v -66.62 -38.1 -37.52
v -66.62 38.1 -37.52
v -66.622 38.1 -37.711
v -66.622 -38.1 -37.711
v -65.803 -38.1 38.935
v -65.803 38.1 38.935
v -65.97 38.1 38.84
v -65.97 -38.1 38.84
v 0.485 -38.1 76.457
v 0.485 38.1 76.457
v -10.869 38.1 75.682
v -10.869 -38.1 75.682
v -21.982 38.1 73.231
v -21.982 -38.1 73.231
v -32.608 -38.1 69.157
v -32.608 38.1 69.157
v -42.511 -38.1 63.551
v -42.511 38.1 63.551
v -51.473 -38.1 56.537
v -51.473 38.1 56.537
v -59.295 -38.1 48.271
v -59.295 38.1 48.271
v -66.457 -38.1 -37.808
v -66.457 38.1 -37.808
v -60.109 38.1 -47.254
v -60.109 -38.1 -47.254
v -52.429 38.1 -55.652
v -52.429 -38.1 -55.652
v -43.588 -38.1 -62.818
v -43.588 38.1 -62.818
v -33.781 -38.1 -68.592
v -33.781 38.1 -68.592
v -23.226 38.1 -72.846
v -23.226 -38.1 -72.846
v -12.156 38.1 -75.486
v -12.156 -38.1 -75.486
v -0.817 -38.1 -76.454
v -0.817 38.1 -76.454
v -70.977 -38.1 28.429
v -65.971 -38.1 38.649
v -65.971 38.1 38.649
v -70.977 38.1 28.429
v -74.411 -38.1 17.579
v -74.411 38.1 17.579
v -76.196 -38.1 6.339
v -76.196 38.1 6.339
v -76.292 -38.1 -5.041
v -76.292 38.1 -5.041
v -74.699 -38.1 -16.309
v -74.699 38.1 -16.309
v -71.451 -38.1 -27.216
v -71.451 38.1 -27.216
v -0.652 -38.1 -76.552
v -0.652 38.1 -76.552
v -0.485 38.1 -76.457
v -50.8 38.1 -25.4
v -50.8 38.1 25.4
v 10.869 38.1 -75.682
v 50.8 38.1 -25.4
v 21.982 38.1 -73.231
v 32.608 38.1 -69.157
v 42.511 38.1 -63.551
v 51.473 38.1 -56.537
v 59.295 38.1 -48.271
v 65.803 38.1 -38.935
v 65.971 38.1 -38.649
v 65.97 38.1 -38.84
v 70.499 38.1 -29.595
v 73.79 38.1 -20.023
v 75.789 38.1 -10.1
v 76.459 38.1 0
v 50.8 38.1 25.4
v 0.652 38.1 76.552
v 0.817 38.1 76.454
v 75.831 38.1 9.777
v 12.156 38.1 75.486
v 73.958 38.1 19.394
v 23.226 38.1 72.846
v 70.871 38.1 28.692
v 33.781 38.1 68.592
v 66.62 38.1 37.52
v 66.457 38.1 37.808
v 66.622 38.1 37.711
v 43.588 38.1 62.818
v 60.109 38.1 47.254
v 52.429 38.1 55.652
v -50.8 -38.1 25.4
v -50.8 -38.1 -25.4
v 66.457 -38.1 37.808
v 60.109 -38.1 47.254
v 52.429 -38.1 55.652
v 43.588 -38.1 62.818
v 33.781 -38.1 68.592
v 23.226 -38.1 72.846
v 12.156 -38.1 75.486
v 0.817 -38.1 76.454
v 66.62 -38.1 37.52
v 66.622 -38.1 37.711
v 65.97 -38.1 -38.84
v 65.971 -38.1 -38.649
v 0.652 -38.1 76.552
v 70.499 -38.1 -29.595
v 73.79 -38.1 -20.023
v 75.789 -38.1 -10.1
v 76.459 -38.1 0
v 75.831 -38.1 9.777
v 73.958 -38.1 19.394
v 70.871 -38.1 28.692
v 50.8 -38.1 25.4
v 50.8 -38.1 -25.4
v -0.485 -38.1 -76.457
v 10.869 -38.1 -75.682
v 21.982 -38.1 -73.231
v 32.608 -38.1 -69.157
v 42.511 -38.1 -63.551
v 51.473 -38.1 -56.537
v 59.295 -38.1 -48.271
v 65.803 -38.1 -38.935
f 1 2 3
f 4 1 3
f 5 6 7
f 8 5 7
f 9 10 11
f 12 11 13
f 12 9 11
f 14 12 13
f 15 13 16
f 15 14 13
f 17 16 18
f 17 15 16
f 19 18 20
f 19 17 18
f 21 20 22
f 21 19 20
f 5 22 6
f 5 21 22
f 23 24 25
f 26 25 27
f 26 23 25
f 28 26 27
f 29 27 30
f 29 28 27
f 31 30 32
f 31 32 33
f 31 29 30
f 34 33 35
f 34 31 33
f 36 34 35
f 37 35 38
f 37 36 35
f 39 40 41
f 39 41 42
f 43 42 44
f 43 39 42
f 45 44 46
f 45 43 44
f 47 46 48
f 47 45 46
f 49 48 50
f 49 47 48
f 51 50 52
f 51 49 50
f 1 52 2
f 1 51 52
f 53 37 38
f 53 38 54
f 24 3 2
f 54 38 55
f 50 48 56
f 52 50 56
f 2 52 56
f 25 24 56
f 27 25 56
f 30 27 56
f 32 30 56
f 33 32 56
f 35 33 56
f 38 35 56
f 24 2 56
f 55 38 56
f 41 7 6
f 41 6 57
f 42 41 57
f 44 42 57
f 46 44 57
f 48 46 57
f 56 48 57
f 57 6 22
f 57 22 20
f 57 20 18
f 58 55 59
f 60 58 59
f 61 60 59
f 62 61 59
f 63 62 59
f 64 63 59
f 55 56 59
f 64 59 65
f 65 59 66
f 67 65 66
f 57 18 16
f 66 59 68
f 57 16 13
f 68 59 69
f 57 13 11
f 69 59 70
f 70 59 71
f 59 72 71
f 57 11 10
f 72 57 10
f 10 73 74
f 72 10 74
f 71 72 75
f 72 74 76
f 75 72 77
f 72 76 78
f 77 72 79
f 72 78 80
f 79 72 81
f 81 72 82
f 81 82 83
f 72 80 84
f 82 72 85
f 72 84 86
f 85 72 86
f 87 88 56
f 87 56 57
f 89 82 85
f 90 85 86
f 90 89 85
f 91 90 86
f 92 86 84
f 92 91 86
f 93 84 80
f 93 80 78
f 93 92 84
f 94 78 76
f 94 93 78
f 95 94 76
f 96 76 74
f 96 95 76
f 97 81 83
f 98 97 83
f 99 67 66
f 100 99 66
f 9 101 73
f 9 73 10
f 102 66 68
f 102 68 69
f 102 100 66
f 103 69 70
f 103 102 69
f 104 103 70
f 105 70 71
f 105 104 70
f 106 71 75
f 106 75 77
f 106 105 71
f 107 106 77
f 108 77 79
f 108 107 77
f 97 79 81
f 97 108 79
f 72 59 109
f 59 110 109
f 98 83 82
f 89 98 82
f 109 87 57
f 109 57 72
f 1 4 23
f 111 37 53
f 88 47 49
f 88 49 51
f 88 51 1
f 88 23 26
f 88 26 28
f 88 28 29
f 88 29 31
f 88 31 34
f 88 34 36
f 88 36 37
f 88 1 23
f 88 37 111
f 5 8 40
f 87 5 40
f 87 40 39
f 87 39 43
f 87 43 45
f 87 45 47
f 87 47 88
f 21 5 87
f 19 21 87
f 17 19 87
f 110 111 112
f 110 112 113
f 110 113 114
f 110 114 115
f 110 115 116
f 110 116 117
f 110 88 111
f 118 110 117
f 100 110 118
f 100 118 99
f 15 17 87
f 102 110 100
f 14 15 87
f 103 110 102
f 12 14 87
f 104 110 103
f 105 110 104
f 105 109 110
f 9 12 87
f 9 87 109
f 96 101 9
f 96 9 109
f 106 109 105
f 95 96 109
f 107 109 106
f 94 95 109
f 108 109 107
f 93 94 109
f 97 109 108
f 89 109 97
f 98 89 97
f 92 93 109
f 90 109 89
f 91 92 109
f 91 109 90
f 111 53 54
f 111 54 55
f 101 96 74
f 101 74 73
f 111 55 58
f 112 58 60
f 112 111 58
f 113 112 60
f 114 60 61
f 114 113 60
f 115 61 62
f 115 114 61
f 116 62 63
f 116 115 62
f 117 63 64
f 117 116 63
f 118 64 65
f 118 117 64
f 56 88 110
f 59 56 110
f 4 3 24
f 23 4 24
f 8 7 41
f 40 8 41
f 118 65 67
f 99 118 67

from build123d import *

# Parameters (mm, degrees)
F0_W     = 101.6
F0_H     = 50.8
F1_DEPTH = 38.1


with BuildPart() as f1:
    # F0 (on Front) → F1 (new body, symmetric)
    with BuildSketch(Plane.XZ):
        with BuildLine():
            ThreePointArc((65.9712880145, -38.6489294899), (73.7903692418, -20.0232864477), (76.4588163197, 0))
            ThreePointArc((76.4588163197, 0), (73.9582301549, 19.3940915064), (66.6200350394, 37.5196151947))
            Line((66.6200350394, 37.5196151947), (65.9712880145, -38.6489294899))
        make_face()
        with BuildLine():
            Line((65.9712880145, -38.6489294899), (66.6200350394, 37.5196151947))
            ThreePointArc((66.6200350394, 37.5196151947), (66.5384735192, 37.6640695456), (66.4565987746, 37.808346596))
            Line((66.4565987746, 37.808346596), (0.8170776208, 76.4544503425))
            ThreePointArc((0.8170776208, 76.4544503425), (0.6511957232, 76.4560431695), (0.4853107601, 76.4572760859))
            Line((0.4853107601, 76.4572760859), (-65.8029574185, 38.9348351477))
            ThreePointArc((-65.8029574185, 38.9348351477), (-65.887277796, 38.7919736239), (-65.9712880145, 38.6489294899))
            Line((-65.9712880145, 38.6489294899), (-66.6200350394, -37.5196151947))
            ThreePointArc((-66.6200350394, -37.5196151947), (-66.5384735192, -37.6640695456), (-66.4565987746, -37.808346596))
            Line((-66.4565987746, -37.808346596), (-0.8170776208, -76.4544503425))
            ThreePointArc((-0.8170776208, -76.4544503425), (-0.6511957232, -76.4560431695), (-0.4853107601, -76.4572760859))
            Line((-0.4853107601, -76.4572760859), (65.8029574185, -38.9348351477))
            ThreePointArc((65.8029574185, -38.9348351477), (65.887277796, -38.7919736239), (65.9712880145, -38.6489294899))
        make_face()
        Rectangle(F0_W, F0_H, mode=Mode.SUBTRACT)
        with BuildLine():
            ThreePointArc((66.4565987746, 37.808346596), (66.5384735192, 37.6640695456), (66.6200350394, 37.5196151947))
            Line((66.6200350394, 37.5196151947), (66.6216664831, 37.7111608811))
            Line((66.6216664831, 37.7111608811), (66.4565987746, 37.808346596))
        make_face()
        with BuildLine():
            Line((65.9696565708, -38.8404751763), (65.9712880145, -38.6489294899))
            ThreePointArc((65.9712880145, -38.6489294899), (65.887277796, -38.7919736239), (65.8029574185, -38.9348351477))
            Line((65.8029574185, -38.9348351477), (65.9696565708, -38.8404751763))
        make_face()
        with BuildLine():
            Line((0.8170776208, 76.4544503425), (66.4565987746, 37.808346596))
            ThreePointArc((66.4565987746, 37.808346596), (38.7919736239, 65.887277796), (0.8170776208, 76.4544503425))
        make_face()
        with BuildLine():
            ThreePointArc((-0.4853107601, -76.4572760859), (37.6640695456, -66.5384735192), (65.8029574185, -38.9348351477))
            Line((65.8029574185, -38.9348351477), (-0.4853107601, -76.4572760859))
        make_face()
        with BuildLine():
            ThreePointArc((0.4853107601, 76.4572760859), (0.6511957232, 76.4560431695), (0.8170776208, 76.4544503425))
            Line((0.8170776208, 76.4544503425), (0.6520099123, 76.5516360573))
            Line((0.6520099123, 76.5516360573), (0.4853107601, 76.4572760859))
        make_face()
        with BuildLine():
            Line((-0.6520099123, -76.5516360573), (-0.4853107601, -76.4572760859))
            ThreePointArc((-0.4853107601, -76.4572760859), (-0.6511957232, -76.4560431695), (-0.8170776208, -76.4544503425))
            Line((-0.8170776208, -76.4544503425), (-0.6520099123, -76.5516360573))
        make_face()
        with BuildLine():
            Line((-65.8029574185, 38.9348351477), (0.4853107601, 76.4572760859))
            ThreePointArc((0.4853107601, 76.4572760859), (-37.6640695456, 66.5384735192), (-65.8029574185, 38.9348351477))
        make_face()
        with BuildLine():
            ThreePointArc((-66.4565987746, -37.808346596), (-38.7919736239, -65.887277796), (-0.8170776208, -76.4544503425))
            Line((-0.8170776208, -76.4544503425), (-66.4565987746, -37.808346596))
        make_face()
        with BuildLine():
            ThreePointArc((-65.9712880145, 38.6489294899), (-65.887277796, 38.7919736239), (-65.8029574185, 38.9348351477))
            Line((-65.8029574185, 38.9348351477), (-65.9696565708, 38.8404751763))
            Line((-65.9696565708, 38.8404751763), (-65.9712880145, 38.6489294899))
        make_face()
        with BuildLine():
            Line((-66.6216664831, -37.7111608811), (-66.4565987746, -37.808346596))
            ThreePointArc((-66.4565987746, -37.808346596), (-66.5384735192, -37.6640695456), (-66.6200350394, -37.5196151947))
            Line((-66.6200350394, -37.5196151947), (-66.6216664831, -37.7111608811))
        make_face()
        with BuildLine():
            Line((-66.6200350394, -37.5196151947), (-65.9712880145, 38.6489294899))
            ThreePointArc((-65.9712880145, 38.6489294899), (-76.4560431695, 0.6511957232), (-66.6200350394, -37.5196151947))
        make_face()
    extrude(amount=F1_DEPTH, both=True)


solid = f1.part
